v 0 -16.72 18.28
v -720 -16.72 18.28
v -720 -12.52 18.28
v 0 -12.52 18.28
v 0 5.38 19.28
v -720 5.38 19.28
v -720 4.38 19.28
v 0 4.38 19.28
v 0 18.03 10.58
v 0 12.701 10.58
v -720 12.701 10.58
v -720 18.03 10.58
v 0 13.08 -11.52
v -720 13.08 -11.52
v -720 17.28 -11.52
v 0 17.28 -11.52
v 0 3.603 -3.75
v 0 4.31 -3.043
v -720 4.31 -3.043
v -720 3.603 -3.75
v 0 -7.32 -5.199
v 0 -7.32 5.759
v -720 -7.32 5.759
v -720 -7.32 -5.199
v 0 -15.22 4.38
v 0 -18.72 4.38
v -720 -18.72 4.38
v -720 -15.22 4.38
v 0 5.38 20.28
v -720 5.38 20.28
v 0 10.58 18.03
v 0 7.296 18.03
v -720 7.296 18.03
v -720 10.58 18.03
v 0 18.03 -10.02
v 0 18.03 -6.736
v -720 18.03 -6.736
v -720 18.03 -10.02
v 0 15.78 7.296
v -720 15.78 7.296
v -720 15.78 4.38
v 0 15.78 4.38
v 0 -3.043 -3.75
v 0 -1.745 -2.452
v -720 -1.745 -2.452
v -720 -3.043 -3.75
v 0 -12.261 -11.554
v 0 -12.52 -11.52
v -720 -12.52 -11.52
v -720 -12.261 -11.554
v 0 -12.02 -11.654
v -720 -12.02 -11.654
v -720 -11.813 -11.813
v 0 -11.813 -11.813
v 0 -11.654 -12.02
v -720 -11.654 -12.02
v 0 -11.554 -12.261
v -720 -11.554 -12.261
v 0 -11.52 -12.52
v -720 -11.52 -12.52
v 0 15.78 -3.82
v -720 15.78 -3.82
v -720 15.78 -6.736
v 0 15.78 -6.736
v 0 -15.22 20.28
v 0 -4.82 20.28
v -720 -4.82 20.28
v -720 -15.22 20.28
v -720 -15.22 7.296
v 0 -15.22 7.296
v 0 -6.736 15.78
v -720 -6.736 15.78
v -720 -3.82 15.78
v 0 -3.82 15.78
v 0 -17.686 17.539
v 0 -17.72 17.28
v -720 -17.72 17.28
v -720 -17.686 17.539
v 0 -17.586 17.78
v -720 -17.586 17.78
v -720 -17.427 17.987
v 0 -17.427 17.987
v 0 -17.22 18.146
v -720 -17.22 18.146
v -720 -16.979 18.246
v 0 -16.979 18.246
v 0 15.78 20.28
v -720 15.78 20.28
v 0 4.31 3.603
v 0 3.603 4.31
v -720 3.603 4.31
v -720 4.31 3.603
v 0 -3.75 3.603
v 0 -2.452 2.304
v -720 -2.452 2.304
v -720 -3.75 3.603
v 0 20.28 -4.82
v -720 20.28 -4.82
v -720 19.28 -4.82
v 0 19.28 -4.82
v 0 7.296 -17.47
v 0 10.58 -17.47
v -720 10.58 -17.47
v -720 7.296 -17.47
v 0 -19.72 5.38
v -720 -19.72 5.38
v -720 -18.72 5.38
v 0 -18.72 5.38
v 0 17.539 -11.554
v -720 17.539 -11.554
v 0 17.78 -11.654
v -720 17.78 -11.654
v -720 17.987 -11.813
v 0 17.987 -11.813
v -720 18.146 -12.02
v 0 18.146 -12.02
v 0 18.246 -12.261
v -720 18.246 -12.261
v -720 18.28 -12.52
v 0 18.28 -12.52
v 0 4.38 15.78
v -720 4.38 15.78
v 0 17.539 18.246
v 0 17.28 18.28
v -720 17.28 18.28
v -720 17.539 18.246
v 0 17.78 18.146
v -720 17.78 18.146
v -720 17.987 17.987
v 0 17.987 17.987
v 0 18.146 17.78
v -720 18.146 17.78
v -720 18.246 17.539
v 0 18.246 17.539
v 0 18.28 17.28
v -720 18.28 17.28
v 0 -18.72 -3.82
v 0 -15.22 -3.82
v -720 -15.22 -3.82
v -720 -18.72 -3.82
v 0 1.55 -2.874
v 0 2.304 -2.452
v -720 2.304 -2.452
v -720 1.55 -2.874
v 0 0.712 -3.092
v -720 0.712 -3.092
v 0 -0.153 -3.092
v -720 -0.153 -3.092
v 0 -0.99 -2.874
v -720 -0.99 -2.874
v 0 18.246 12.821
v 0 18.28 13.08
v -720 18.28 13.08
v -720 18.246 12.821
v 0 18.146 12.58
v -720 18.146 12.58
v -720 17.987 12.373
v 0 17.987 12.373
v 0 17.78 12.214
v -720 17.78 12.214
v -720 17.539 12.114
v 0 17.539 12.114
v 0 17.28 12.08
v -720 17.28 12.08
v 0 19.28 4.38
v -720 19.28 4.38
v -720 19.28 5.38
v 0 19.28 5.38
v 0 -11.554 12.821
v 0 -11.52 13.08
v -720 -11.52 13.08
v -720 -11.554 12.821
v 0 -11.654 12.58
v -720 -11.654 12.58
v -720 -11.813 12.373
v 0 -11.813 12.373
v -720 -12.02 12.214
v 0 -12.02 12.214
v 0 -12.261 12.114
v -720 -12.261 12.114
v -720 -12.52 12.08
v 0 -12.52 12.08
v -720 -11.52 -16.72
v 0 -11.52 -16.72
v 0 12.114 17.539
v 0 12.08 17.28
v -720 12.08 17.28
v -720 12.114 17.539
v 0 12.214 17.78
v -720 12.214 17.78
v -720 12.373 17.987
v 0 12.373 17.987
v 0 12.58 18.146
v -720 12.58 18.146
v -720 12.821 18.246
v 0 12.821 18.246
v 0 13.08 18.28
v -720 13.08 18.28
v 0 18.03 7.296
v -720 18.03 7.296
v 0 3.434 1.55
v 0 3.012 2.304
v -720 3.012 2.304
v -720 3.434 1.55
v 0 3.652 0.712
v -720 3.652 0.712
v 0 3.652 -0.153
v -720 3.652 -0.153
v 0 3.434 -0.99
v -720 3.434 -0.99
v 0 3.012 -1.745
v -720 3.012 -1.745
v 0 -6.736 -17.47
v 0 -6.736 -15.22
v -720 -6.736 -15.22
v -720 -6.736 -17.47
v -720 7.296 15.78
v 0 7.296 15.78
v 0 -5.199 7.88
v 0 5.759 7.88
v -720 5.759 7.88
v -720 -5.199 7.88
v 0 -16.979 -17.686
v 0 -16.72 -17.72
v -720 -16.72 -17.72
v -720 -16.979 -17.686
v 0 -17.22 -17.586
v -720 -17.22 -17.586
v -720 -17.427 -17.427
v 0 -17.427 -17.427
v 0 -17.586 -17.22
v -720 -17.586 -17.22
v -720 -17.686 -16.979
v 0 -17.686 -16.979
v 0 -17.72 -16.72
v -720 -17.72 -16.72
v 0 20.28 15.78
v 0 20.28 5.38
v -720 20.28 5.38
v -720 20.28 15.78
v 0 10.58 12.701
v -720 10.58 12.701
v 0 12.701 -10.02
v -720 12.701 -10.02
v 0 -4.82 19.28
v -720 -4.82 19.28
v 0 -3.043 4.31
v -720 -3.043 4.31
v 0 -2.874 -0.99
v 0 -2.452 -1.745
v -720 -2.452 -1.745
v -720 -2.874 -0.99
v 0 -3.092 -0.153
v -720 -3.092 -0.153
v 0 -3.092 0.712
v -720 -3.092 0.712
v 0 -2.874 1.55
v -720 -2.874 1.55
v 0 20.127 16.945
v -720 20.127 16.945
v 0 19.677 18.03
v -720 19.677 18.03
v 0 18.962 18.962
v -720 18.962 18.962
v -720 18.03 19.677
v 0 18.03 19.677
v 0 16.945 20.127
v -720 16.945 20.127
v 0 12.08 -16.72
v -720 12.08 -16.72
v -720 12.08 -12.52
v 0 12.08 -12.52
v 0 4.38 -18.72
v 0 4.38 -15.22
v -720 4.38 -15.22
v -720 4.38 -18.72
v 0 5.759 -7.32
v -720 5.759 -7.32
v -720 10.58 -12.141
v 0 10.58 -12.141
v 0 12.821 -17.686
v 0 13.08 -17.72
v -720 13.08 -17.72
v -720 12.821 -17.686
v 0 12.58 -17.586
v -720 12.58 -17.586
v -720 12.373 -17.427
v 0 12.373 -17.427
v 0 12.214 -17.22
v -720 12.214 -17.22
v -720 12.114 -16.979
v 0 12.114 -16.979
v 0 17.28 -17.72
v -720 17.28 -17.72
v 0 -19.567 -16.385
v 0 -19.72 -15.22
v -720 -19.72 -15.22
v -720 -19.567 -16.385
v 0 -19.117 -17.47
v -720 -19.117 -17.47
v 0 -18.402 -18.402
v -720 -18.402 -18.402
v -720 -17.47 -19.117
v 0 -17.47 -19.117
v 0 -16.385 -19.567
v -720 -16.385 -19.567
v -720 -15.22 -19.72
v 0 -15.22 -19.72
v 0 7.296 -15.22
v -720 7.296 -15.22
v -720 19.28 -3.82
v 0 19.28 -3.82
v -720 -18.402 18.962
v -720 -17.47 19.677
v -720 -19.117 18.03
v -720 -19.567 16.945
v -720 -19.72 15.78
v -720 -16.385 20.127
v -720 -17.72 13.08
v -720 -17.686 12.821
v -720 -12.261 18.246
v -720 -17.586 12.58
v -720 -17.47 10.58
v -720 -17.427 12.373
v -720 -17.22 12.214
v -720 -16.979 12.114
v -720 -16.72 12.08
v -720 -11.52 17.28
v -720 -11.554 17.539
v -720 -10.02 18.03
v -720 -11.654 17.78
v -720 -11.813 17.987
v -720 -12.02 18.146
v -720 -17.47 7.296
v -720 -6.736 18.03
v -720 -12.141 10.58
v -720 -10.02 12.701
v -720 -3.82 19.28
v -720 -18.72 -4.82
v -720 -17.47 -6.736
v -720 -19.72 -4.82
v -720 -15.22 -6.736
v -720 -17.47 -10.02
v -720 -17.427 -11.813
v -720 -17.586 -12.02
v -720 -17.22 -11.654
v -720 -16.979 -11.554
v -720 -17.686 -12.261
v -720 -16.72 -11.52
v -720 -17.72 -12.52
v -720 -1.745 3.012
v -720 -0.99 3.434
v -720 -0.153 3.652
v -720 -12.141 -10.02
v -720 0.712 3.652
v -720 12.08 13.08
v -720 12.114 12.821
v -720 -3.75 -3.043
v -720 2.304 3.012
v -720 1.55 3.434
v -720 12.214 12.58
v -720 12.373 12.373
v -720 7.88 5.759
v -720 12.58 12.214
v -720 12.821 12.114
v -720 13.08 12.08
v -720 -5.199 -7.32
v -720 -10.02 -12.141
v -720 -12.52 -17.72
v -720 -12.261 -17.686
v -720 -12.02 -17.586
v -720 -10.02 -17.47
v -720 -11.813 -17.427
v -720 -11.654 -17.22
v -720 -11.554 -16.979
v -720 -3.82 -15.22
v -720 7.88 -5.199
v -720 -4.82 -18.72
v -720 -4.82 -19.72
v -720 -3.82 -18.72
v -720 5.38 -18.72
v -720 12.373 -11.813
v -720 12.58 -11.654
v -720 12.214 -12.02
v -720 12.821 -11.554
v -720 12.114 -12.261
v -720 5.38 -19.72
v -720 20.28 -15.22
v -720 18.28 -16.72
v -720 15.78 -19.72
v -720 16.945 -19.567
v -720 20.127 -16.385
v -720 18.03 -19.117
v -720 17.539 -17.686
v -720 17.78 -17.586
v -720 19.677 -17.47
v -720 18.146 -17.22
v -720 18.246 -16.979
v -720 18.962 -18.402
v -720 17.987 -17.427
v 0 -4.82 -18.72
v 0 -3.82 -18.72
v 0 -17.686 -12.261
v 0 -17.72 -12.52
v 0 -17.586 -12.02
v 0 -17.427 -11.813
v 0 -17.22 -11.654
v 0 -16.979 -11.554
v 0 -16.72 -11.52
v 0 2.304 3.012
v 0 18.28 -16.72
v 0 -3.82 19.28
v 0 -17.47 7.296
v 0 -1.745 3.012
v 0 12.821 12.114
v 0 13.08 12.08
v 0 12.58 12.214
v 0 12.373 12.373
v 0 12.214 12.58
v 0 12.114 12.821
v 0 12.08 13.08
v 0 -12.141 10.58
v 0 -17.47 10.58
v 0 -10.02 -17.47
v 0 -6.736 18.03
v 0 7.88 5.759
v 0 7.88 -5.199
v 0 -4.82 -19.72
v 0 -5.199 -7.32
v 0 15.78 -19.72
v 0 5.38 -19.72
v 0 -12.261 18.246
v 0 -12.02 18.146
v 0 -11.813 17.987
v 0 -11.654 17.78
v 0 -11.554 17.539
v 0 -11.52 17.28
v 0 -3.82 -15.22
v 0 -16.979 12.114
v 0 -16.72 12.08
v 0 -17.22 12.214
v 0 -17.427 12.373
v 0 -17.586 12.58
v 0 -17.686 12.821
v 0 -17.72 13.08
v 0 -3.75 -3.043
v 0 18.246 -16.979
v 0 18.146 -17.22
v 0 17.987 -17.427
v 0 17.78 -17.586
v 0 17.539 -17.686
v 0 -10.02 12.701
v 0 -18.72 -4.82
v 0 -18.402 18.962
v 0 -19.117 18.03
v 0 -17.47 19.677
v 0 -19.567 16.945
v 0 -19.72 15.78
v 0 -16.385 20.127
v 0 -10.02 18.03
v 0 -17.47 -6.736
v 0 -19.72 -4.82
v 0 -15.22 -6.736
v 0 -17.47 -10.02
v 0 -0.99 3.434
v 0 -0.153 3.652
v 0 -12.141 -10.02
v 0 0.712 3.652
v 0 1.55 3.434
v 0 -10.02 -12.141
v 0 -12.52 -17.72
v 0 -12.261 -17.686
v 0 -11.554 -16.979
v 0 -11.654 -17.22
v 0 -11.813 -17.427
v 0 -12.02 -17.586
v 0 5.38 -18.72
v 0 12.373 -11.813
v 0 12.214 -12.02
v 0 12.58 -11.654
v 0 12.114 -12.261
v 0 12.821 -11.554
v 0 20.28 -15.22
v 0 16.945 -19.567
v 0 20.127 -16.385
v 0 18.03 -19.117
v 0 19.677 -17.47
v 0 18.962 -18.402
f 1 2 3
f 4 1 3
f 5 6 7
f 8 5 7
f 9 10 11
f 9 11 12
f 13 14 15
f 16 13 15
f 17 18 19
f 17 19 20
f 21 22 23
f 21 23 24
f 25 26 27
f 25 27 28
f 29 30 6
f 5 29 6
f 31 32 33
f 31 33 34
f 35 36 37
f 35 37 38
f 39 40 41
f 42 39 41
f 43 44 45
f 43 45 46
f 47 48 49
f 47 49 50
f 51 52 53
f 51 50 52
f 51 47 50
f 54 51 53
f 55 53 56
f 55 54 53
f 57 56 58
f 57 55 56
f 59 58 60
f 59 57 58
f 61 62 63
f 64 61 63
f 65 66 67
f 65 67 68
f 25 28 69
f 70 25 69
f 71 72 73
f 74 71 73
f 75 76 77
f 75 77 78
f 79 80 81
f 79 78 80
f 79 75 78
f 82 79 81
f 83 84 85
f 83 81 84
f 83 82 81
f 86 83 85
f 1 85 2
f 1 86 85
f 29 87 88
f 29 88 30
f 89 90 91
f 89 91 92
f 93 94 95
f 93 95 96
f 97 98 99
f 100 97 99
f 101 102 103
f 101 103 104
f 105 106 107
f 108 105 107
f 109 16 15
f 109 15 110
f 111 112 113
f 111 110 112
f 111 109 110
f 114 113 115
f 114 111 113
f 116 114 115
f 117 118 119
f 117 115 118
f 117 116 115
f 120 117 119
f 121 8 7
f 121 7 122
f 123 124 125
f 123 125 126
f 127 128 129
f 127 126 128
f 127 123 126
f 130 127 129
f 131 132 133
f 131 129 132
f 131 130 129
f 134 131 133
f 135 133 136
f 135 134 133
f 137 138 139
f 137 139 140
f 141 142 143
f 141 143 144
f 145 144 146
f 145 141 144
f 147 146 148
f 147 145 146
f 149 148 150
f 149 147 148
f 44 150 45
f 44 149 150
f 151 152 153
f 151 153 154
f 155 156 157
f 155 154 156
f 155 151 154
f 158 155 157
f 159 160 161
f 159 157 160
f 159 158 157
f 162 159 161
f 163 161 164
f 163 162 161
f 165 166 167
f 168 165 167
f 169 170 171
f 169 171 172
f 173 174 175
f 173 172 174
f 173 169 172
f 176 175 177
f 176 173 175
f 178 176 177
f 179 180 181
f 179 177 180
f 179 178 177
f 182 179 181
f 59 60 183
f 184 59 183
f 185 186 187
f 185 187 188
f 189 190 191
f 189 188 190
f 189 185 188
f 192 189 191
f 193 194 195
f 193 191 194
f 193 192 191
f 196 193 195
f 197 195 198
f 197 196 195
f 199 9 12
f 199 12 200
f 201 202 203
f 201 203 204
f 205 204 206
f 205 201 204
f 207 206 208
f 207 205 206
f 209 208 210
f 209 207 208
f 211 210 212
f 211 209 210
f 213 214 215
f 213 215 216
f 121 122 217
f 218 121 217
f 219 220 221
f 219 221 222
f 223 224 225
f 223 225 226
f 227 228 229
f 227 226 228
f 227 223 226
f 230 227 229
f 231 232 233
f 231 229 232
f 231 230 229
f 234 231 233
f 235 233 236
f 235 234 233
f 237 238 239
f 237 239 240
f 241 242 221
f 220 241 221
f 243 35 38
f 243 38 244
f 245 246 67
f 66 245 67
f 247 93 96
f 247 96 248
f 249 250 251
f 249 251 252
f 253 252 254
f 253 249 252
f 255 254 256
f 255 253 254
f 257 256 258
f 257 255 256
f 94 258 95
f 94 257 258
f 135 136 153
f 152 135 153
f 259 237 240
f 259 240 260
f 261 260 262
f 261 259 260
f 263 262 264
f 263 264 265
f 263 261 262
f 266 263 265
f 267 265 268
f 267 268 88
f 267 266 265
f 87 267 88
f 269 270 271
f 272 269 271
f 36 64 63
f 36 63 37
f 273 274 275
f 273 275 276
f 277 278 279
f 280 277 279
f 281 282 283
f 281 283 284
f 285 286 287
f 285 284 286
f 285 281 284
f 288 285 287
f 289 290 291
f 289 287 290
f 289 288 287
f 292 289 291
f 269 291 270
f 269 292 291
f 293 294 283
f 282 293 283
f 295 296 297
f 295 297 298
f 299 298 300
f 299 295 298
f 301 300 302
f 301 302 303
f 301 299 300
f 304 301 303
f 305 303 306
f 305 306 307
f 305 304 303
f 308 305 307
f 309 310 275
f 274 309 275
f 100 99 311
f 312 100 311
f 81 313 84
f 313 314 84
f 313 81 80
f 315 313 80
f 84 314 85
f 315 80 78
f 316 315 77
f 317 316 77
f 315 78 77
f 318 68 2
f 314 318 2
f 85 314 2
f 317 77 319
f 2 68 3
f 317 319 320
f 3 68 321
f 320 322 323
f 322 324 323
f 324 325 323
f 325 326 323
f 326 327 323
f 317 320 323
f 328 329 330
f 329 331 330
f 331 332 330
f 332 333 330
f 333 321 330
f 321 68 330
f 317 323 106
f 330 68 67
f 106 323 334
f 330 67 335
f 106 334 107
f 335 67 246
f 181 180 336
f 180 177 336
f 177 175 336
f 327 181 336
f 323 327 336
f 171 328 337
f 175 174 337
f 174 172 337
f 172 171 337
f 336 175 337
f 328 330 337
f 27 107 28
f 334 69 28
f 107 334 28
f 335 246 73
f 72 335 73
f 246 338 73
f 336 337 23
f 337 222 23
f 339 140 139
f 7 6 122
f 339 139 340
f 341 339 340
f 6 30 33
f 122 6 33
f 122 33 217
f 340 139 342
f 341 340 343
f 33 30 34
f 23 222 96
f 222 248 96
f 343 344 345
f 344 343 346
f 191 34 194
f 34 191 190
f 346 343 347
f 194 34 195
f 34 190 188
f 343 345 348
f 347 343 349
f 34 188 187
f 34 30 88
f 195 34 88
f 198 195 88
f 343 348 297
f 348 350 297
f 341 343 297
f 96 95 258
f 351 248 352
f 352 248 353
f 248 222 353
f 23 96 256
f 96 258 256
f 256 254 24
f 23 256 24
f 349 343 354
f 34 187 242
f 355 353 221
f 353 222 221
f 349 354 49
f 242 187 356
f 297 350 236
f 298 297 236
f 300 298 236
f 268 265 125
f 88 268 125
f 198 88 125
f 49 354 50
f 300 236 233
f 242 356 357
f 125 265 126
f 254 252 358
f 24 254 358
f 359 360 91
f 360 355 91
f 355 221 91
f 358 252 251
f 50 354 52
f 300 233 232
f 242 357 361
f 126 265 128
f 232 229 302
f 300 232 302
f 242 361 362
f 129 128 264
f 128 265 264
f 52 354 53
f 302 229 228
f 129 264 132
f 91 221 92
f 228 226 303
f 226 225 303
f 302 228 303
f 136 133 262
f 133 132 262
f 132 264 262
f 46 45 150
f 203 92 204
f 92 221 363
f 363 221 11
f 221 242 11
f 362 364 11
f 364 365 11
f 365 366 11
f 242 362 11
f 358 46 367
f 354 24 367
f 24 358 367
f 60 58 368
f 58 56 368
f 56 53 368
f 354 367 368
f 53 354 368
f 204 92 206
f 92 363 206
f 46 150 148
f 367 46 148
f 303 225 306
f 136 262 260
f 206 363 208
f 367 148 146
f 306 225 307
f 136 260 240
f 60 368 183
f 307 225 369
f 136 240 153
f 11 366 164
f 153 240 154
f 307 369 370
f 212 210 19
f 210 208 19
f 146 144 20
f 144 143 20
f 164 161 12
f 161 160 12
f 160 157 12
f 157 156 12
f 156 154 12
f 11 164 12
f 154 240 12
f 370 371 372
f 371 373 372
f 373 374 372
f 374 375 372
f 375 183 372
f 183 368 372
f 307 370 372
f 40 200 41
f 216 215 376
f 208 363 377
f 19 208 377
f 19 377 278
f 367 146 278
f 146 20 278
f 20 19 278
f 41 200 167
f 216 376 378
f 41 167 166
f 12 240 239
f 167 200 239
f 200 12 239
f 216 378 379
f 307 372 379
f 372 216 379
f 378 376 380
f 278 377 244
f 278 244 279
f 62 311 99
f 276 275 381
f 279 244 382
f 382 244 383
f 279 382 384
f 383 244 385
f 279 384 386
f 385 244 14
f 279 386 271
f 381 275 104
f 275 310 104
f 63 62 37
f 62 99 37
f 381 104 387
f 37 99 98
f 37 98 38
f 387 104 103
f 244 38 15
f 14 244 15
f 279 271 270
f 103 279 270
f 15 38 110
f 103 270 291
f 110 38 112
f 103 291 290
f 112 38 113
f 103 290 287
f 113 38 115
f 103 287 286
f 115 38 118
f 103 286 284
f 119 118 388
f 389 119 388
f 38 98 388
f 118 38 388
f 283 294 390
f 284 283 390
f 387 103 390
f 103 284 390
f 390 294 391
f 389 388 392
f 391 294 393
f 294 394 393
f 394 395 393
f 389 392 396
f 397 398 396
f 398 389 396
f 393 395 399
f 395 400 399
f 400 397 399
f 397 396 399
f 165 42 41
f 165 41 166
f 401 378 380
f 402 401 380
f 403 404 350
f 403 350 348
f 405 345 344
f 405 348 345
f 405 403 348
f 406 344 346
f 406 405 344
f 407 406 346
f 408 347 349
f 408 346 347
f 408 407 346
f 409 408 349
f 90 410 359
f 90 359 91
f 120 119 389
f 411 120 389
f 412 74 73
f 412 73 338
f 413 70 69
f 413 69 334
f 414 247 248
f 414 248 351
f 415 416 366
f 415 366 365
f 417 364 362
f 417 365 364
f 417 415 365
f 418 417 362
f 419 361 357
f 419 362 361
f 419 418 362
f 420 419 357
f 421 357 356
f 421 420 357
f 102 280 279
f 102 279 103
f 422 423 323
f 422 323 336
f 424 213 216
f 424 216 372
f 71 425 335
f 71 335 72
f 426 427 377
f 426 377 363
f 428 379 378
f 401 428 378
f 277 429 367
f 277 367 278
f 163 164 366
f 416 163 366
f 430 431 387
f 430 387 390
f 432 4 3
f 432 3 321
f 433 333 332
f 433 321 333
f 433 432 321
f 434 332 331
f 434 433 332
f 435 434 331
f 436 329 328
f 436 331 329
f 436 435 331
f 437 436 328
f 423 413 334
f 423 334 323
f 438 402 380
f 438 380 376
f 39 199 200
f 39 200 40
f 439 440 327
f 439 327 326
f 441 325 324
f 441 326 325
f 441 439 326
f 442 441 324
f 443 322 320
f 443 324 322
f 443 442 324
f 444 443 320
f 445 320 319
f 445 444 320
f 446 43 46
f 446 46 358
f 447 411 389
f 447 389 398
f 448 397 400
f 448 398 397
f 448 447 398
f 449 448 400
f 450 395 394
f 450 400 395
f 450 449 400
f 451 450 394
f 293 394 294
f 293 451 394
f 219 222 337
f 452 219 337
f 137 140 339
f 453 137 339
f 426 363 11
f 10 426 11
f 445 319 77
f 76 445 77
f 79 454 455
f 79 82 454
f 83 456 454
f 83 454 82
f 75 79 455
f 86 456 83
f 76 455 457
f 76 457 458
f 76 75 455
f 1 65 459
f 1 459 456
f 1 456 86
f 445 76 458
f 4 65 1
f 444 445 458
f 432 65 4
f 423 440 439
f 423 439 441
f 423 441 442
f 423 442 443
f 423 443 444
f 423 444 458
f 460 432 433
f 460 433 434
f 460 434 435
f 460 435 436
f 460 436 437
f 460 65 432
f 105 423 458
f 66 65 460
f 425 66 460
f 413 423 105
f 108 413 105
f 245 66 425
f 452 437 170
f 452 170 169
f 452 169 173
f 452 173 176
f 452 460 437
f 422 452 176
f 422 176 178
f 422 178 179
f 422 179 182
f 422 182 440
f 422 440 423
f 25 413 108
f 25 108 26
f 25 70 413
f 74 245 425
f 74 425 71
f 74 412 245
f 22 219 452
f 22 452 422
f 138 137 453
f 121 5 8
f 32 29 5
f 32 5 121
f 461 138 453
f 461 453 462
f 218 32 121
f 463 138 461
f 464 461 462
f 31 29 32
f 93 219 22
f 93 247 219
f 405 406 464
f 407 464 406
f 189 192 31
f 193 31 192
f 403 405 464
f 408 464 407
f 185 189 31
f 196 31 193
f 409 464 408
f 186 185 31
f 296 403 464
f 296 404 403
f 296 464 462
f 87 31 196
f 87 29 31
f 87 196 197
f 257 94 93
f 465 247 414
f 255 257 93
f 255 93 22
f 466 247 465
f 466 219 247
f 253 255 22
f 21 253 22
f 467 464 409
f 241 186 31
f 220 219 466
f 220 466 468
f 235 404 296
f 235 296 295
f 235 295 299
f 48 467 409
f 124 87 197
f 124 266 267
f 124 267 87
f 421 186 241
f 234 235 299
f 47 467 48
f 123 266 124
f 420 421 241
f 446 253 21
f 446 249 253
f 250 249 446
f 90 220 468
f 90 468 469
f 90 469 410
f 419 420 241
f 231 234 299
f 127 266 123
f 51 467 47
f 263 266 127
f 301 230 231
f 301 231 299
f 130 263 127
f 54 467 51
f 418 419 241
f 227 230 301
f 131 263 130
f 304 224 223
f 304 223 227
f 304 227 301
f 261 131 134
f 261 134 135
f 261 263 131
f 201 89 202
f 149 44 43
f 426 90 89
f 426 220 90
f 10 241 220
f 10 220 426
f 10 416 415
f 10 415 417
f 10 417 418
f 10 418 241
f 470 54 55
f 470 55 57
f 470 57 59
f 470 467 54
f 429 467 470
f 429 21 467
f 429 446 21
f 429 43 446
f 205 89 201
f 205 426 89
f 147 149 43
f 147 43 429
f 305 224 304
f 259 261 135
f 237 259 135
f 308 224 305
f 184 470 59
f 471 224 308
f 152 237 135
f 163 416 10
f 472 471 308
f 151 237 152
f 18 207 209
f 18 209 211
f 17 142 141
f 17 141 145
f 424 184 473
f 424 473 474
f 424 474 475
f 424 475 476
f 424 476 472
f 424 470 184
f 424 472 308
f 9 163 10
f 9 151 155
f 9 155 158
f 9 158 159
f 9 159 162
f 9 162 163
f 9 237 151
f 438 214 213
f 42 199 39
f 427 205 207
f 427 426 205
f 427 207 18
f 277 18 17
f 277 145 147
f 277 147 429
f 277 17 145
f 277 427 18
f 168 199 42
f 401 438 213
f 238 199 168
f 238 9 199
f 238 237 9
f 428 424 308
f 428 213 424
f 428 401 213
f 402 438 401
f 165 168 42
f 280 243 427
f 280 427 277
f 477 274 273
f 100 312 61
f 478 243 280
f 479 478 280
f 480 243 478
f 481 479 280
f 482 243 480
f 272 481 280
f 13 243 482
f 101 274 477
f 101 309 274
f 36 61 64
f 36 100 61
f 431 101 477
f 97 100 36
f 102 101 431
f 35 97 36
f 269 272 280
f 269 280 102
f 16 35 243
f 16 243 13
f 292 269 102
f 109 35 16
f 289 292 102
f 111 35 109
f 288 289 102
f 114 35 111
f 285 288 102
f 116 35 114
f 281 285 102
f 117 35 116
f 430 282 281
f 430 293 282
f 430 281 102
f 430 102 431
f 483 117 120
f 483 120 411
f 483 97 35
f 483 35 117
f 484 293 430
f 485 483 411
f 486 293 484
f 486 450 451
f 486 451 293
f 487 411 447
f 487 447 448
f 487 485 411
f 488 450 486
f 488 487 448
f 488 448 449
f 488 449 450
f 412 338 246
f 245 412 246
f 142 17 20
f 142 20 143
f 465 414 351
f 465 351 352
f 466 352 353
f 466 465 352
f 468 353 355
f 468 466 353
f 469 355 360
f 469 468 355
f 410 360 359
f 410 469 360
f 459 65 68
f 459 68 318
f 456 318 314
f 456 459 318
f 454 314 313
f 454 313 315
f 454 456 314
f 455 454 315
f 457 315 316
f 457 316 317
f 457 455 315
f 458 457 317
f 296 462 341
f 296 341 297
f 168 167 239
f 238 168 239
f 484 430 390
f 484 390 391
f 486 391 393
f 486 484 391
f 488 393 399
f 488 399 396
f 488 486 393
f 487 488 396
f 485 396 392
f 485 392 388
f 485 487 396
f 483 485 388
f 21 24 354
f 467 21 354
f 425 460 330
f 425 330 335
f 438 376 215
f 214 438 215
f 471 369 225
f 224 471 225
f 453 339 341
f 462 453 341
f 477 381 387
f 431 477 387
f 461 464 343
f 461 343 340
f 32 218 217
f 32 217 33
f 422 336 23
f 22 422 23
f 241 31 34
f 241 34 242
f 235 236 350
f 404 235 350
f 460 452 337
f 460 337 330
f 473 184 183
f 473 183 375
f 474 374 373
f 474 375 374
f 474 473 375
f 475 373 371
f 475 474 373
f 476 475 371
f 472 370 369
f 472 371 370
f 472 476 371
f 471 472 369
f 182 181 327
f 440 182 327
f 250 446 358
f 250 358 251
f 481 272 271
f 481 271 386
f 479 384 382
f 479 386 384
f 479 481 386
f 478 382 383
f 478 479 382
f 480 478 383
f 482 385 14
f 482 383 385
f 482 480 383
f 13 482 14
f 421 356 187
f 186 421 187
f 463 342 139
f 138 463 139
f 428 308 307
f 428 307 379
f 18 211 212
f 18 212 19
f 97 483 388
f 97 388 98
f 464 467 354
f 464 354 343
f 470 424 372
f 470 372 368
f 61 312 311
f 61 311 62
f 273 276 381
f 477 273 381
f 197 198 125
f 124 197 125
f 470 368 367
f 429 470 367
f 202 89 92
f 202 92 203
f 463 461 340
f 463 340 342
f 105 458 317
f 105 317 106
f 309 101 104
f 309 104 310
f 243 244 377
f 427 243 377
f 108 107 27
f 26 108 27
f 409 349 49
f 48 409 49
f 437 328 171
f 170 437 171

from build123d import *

# Parameters (mm, degrees)
EXTRUDE_1_DEPTH = 50
EXTRUDE_2_DEPTH = 720


with BuildPart() as part:
    # 草图1 → 凸台-拉伸1 (new body)
    with BuildSketch(Plane(origin=(0, 0, 0), x_dir=(0, 0, -1), z_dir=(1, 0, 0))):
        with BuildLine():
            Line((4.82004008, 19.27995992), (3.82004008, 19.27995992))
            Line((3.82004008, 19.27995992), (3.82004008, 15.77995992))
            Line((3.82004008, 15.77995992), (6.73639159, 15.77995992))
            Line((6.73639159, 15.77995992), (6.73639159, 18.02995992))
            Line((6.73639159, 18.02995992), (10.02004008, 18.02995992))
            Line((10.02004008, 18.02995992), (10.02004008, 12.70128026))
            Line((10.02004008, 12.70128026), (5.19871974, 7.87995992))
            Line((5.19871974, 7.87995992), (-5.75863958, 7.87995992))
            Line((-5.75863958, 7.87995992), (-10.57995992, 12.70128026))
            Line((-10.57995992, 12.70128026), (-10.57995992, 18.02995992))
            Line((-10.57995992, 18.02995992), (-7.29631143, 18.02995992))
            Line((-7.29631143, 18.02995992), (-7.29631143, 15.77995992))
            Line((-7.29631143, 15.77995992), (-4.37995992, 15.77995992))
            Line((-4.37995992, 15.77995992), (-4.37995992, 19.27995992))
            Line((-4.37995992, 19.27995992), (-5.37995992, 19.27995992))
            Line((-5.37995992, 19.27995992), (-5.37995992, 20.27995992))
            Line((-5.37995992, 20.27995992), (-15.77995992, 20.27995992))
            ThreePointArc((-15.77995992, 20.27995992), (-18.961940435, 18.961940435), (-20.27995992, 15.77995992))
            Line((-20.27995992, 15.77995992), (-20.27995992, 5.37995992))
            Line((-20.27995992, 5.37995992), (-19.27995992, 5.37995992))
            Line((-19.27995992, 5.37995992), (-19.27995992, 4.37995992))
            Line((-19.27995992, 4.37995992), (-15.77995992, 4.37995992))
            Line((-15.77995992, 4.37995992), (-15.77995992, 7.29631143))
            Line((-15.77995992, 7.29631143), (-18.02995992, 7.29631143))
            Line((-18.02995992, 7.29631143), (-18.02995992, 10.57995992))
            Line((-18.02995992, 10.57995992), (-12.70128026, 10.57995992))
            Line((-12.70128026, 10.57995992), (-7.87995992, 5.75863958))
            Line((-7.87995992, 5.75863958), (-7.87995992, -5.19871974))
            Line((-7.87995992, -5.19871974), (-12.70128026, -10.02004008))
            Line((-12.70128026, -10.02004008), (-18.02995992, -10.02004008))
            Line((-18.02995992, -10.02004008), (-18.02995992, -6.73639159))
            Line((-18.02995992, -6.73639159), (-15.77995992, -6.73639159))
            Line((-15.77995992, -6.73639159), (-15.77995992, -3.82004008))
            Line((-15.77995992, -3.82004008), (-19.27995992, -3.82004008))
            Line((-19.27995992, -3.82004008), (-19.27995992, -4.82004008))
            Line((-19.27995992, -4.82004008), (-20.27995992, -4.82004008))
            Line((-20.27995992, -4.82004008), (-20.27995992, -15.22004008))
            ThreePointArc((-20.27995992, -15.22004008), (-18.961940435, -18.402020595), (-15.77995992, -19.72004008))
            Line((-15.77995992, -19.72004008), (-5.37995992, -19.72004008))
            Line((-5.37995992, -19.72004008), (-5.37995992, -18.72004008))
            Line((-5.37995992, -18.72004008), (-4.37995992, -18.72004008))
            Line((-4.37995992, -18.72004008), (-4.37995992, -15.22004008))
            Line((-4.37995992, -15.22004008), (-7.29631143, -15.22004008))
            Line((-7.29631143, -15.22004008), (-7.29631143, -17.47004008))
            Line((-7.29631143, -17.47004008), (-10.57995992, -17.47004008))
            Line((-10.57995992, -17.47004008), (-10.57995992, -12.14136042))
            Line((-10.57995992, -12.14136042), (-5.75863958, -7.32004008))
            Line((-5.75863958, -7.32004008), (5.19871974, -7.32004008))
            Line((5.19871974, -7.32004008), (10.02004008, -12.14136042))
            Line((10.02004008, -12.14136042), (10.02004008, -17.47004008))
            Line((10.02004008, -17.47004008), (6.73639159, -17.47004008))
            Line((6.73639159, -17.47004008), (6.73639159, -15.22004008))
            Line((6.73639159, -15.22004008), (3.82004008, -15.22004008))
            Line((3.82004008, -15.22004008), (3.82004008, -18.72004008))
            Line((3.82004008, -18.72004008), (4.82004008, -18.72004008))
            Line((4.82004008, -18.72004008), (4.82004008, -19.72004008))
            Line((4.82004008, -19.72004008), (15.22004008, -19.72004008))
            ThreePointArc((15.22004008, -19.72004008), (18.402020595, -18.402020595), (19.72004008, -15.22004008))
            Line((19.72004008, -15.22004008), (19.72004008, -4.82004008))
            Line((19.72004008, -4.82004008), (18.72004008, -4.82004008))
            Line((18.72004008, -4.82004008), (18.72004008, -3.82004008))
            Line((18.72004008, -3.82004008), (15.22004008, -3.82004008))
            Line((15.22004008, -3.82004008), (15.22004008, -6.73639159))
            Line((15.22004008, -6.73639159), (17.47004008, -6.73639159))
            Line((17.47004008, -6.73639159), (17.47004008, -10.02004008))
            Line((17.47004008, -10.02004008), (12.14136042, -10.02004008))
            Line((12.14136042, -10.02004008), (7.32004008, -5.19871974))
            Line((7.32004008, -5.19871974), (7.32004008, 5.75863958))
            Line((7.32004008, 5.75863958), (12.14136042, 10.57995992))
            Line((12.14136042, 10.57995992), (17.47004008, 10.57995992))
            Line((17.47004008, 10.57995992), (17.47004008, 7.29631143))
            Line((17.47004008, 7.29631143), (15.22004008, 7.29631143))
            Line((15.22004008, 7.29631143), (15.22004008, 4.37995992))
            Line((15.22004008, 4.37995992), (18.72004008, 4.37995992))
            Line((18.72004008, 4.37995992), (18.72004008, 5.37995992))
            Line((18.72004008, 5.37995992), (19.72004008, 5.37995992))
            Line((19.72004008, 5.37995992), (19.72004008, 15.77995992))
            ThreePointArc((19.72004008, 15.77995992), (18.402020595, 18.961940435), (15.22004008, 20.27995992))
            Line((15.22004008, 20.27995992), (4.82004008, 20.27995992))
            Line((4.82004008, 20.27995992), (4.82004008, 19.27995992))
        make_face()
        with BuildLine():
            Line((-13.07995992, -17.72004008), (-17.27995992, -17.72004008))
            ThreePointArc((-17.27995992, -17.72004008), (-17.987066701, -17.427146861), (-18.27995992, -16.72004008))
            Line((-18.27995992, -16.72004008), (-18.27995992, -12.52004008))
            ThreePointArc((-18.27995992, -12.52004008), (-17.987066701, -11.812933299), (-17.27995992, -11.52004008))
            Line((-17.27995992, -11.52004008), (-13.07995992, -11.52004008))
            ThreePointArc((-13.07995992, -11.52004008), (-12.372853139, -11.812933299), (-12.07995992, -12.52004008))
            Line((-12.07995992, -12.52004008), (-12.07995992, -16.72004008))
            ThreePointArc((-12.07995992, -16.72004008), (-12.372853139, -17.427146861), (-13.07995992, -17.72004008))
        make_face(mode=Mode.SUBTRACT)
        with BuildLine():
            Line((-17.27995992, 18.27995992), (-13.07995992, 18.27995992))
            ThreePointArc((-13.07995992, 18.27995992), (-12.372853139, 17.987066701), (-12.07995992, 17.27995992))
            Line((-12.07995992, 17.27995992), (-12.07995992, 13.07995992))
            ThreePointArc((-12.07995992, 13.07995992), (-12.372853139, 12.372853139), (-13.07995992, 12.07995992))
            Line((-13.07995992, 12.07995992), (-17.27995992, 12.07995992))
            ThreePointArc((-17.27995992, 12.07995992), (-17.987066701, 12.372853139), (-18.27995992, 13.07995992))
            Line((-18.27995992, 13.07995992), (-18.27995992, 17.27995992))
            ThreePointArc((-18.27995992, 17.27995992), (-17.987066701, 17.987066701), (-17.27995992, 18.27995992))
        make_face(mode=Mode.SUBTRACT)
        with BuildLine():
            Line((16.72004008, 12.07995992), (12.52004008, 12.07995992))
            ThreePointArc((12.52004008, 12.07995992), (11.812933299, 12.372853139), (11.52004008, 13.07995992))
            Line((11.52004008, 13.07995992), (11.52004008, 17.27995992))
            ThreePointArc((11.52004008, 17.27995992), (11.812933299, 17.987066701), (12.52004008, 18.27995992))
            Line((12.52004008, 18.27995992), (16.72004008, 18.27995992))
            ThreePointArc((16.72004008, 18.27995992), (17.427146861, 17.987066701), (17.72004008, 17.27995992))
            Line((17.72004008, 17.27995992), (17.72004008, 13.07995992))
            ThreePointArc((17.72004008, 13.07995992), (17.427146861, 12.372853139), (16.72004008, 12.07995992))
        make_face(mode=Mode.SUBTRACT)
        with BuildLine():
            Line((3.75045895, -3.04335217), (3.04335217, -3.75045895))
            Line((3.04335217, -3.75045895), (1.74451108, -2.45161786))
            ThreePointArc((1.74451108, -2.45161786), (-0.27995992, -3.12004008), (-2.30443092, -2.45161786))
            Line((-2.30443092, -2.45161786), (-3.60327201, -3.75045895))
            Line((-3.60327201, -3.75045895), (-4.31037879, -3.04335217))
            Line((-4.31037879, -3.04335217), (-3.0115377, -1.74451108))
            ThreePointArc((-3.0115377, -1.74451108), (-3.67995992, 0.27995992), (-3.0115377, 2.30443092))
            Line((-3.0115377, 2.30443092), (-4.31037879, 3.60327201))
            Line((-4.31037879, 3.60327201), (-3.60327201, 4.31037879))
            Line((-3.60327201, 4.31037879), (-2.30443092, 3.0115377))
            ThreePointArc((-2.30443092, 3.0115377), (-0.27995992, 3.67995992), (1.74451108, 3.0115377))
            Line((1.74451108, 3.0115377), (3.04335217, 4.31037879))
            Line((3.04335217, 4.31037879), (3.75045895, 3.60327201))
            Line((3.75045895, 3.60327201), (2.45161786, 2.30443092))
            ThreePointArc((2.45161786, 2.30443092), (3.12004008, 0.27995992), (2.45161786, -1.74451108))
            Line((2.45161786, -1.74451108), (3.75045895, -3.04335217))
        make_face(mode=Mode.SUBTRACT)
        with BuildLine():
            Line((17.72004008, -12.52004008), (17.72004008, -16.72004008))
            ThreePointArc((17.72004008, -16.72004008), (17.427146861, -17.427146861), (16.72004008, -17.72004008))
            Line((16.72004008, -17.72004008), (12.52004008, -17.72004008))
            ThreePointArc((12.52004008, -17.72004008), (11.812933299, -17.427146861), (11.52004008, -16.72004008))
            Line((11.52004008, -16.72004008), (11.52004008, -12.52004008))
            ThreePointArc((11.52004008, -12.52004008), (11.812933299, -11.812933299), (12.52004008, -11.52004008))
            Line((12.52004008, -11.52004008), (16.72004008, -11.52004008))
            ThreePointArc((16.72004008, -11.52004008), (17.427146861, -11.812933299), (17.72004008, -12.52004008))
        make_face(mode=Mode.SUBTRACT)
    extrude(amount=-EXTRUDE_1_DEPTH)

    # 草图2 → 凸台-拉伸2 (add)
    with BuildSketch(Plane(origin=(0, 0, 0), x_dir=(0, 0, -1), z_dir=(1, 0, 0))):
        with BuildLine():
            Line((19.72004008, 5.37995992), (19.72004008, 15.77995992))
            ThreePointArc((19.72004008, 15.77995992), (18.402020595, 18.961940435), (15.22004008, 20.27995992))
            Line((15.22004008, 20.27995992), (4.82004008, 20.27995992))
            Line((4.82004008, 20.27995992), (4.82004008, 19.27995992))
            Line((4.82004008, 19.27995992), (3.82004008, 19.27995992))
            Line((3.82004008, 19.27995992), (3.82004008, 15.77995992))
            Line((3.82004008, 15.77995992), (6.73639159, 15.77995992))
            Line((6.73639159, 15.77995992), (6.73639159, 18.02995992))
            Line((6.73639159, 18.02995992), (10.02004008, 18.02995992))
            Line((10.02004008, 18.02995992), (10.02004008, 12.70128026))
            Line((10.02004008, 12.70128026), (5.19871974, 7.87995992))
            Line((5.19871974, 7.87995992), (-5.75863958, 7.87995992))
            Line((-5.75863958, 7.87995992), (-10.57995992, 12.70128026))
            Line((-10.57995992, 12.70128026), (-10.57995992, 18.02995992))
            Line((-10.57995992, 18.02995992), (-7.29631143, 18.02995992))
            Line((-7.29631143, 18.02995992), (-7.29631143, 15.77995992))
            Line((-7.29631143, 15.77995992), (-4.37995992, 15.77995992))
            Line((-4.37995992, 15.77995992), (-4.37995992, 19.27995992))
            Line((-4.37995992, 19.27995992), (-5.37995992, 19.27995992))
            Line((-5.37995992, 19.27995992), (-5.37995992, 20.27995992))
            Line((-5.37995992, 20.27995992), (-15.77995992, 20.27995992))
            ThreePointArc((-15.77995992, 20.27995992), (-18.961940435, 18.961940435), (-20.27995992, 15.77995992))
            Line((-20.27995992, 15.77995992), (-20.27995992, 5.37995992))
            Line((-20.27995992, 5.37995992), (-19.27995992, 5.37995992))
            Line((-19.27995992, 5.37995992), (-19.27995992, 4.37995992))
            Line((-19.27995992, 4.37995992), (-15.77995992, 4.37995992))
            Line((-15.77995992, 4.37995992), (-15.77995992, 7.29631143))
            Line((-15.77995992, 7.29631143), (-18.02995992, 7.29631143))
            Line((-18.02995992, 7.29631143), (-18.02995992, 10.57995992))
            Line((-18.02995992, 10.57995992), (-12.70128026, 10.57995992))
            Line((-12.70128026, 10.57995992), (-7.87995992, 5.75863958))
            Line((-7.87995992, 5.75863958), (-7.87995992, -5.19871974))
            Line((-7.87995992, -5.19871974), (-12.70128026, -10.02004008))
            Line((-12.70128026, -10.02004008), (-18.02995992, -10.02004008))
            Line((-18.02995992, -10.02004008), (-18.02995992, -6.73639159))
            Line((-18.02995992, -6.73639159), (-15.77995992, -6.73639159))
            Line((-15.77995992, -6.73639159), (-15.77995992, -3.82004008))
            Line((-15.77995992, -3.82004008), (-19.27995992, -3.82004008))
            Line((-19.27995992, -3.82004008), (-19.27995992, -4.82004008))
            Line((-19.27995992, -4.82004008), (-20.27995992, -4.82004008))
            Line((-20.27995992, -4.82004008), (-20.27995992, -15.22004008))
            ThreePointArc((-20.27995992, -15.22004008), (-18.961940435, -18.402020595), (-15.77995992, -19.72004008))
            Line((-15.77995992, -19.72004008), (-5.37995992, -19.72004008))
            Line((-5.37995992, -19.72004008), (-5.37995992, -18.72004008))
            Line((-5.37995992, -18.72004008), (-4.37995992, -18.72004008))
            Line((-4.37995992, -18.72004008), (-4.37995992, -15.22004008))
            Line((-4.37995992, -15.22004008), (-7.29631143, -15.22004008))
            Line((-7.29631143, -15.22004008), (-7.29631143, -17.47004008))
            Line((-7.29631143, -17.47004008), (-10.57995992, -17.47004008))
            Line((-10.57995992, -17.47004008), (-10.57995992, -12.14136042))
            Line((-10.57995992, -12.14136042), (-5.75863958, -7.32004008))
            Line((-5.75863958, -7.32004008), (5.19871974, -7.32004008))
            Line((5.19871974, -7.32004008), (10.02004008, -12.14136042))
            Line((10.02004008, -12.14136042), (10.02004008, -17.47004008))
            Line((10.02004008, -17.47004008), (6.73639159, -17.47004008))
            Line((6.73639159, -17.47004008), (6.73639159, -15.22004008))
            Line((6.73639159, -15.22004008), (3.82004008, -15.22004008))
            Line((3.82004008, -15.22004008), (3.82004008, -18.72004008))
            Line((3.82004008, -18.72004008), (4.82004008, -18.72004008))
            Line((4.82004008, -18.72004008), (4.82004008, -19.72004008))
            Line((4.82004008, -19.72004008), (15.22004008, -19.72004008))
            ThreePointArc((15.22004008, -19.72004008), (18.402020595, -18.402020595), (19.72004008, -15.22004008))
            Line((19.72004008, -15.22004008), (19.72004008, -4.82004008))
            Line((19.72004008, -4.82004008), (18.72004008, -4.82004008))
            Line((18.72004008, -4.82004008), (18.72004008, -3.82004008))
            Line((18.72004008, -3.82004008), (15.22004008, -3.82004008))
            Line((15.22004008, -3.82004008), (15.22004008, -6.73639159))
            Line((15.22004008, -6.73639159), (17.47004008, -6.73639159))
            Line((17.47004008, -6.73639159), (17.47004008, -10.02004008))
            Line((17.47004008, -10.02004008), (12.14136042, -10.02004008))
            Line((12.14136042, -10.02004008), (7.32004008, -5.19871974))
            Line((7.32004008, -5.19871974), (7.32004008, 5.75863958))
            Line((7.32004008, 5.75863958), (12.14136042, 10.57995992))
            Line((12.14136042, 10.57995992), (17.47004008, 10.57995992))
            Line((17.47004008, 10.57995992), (17.47004008, 7.29631143))
            Line((17.47004008, 7.29631143), (15.22004008, 7.29631143))
            Line((15.22004008, 7.29631143), (15.22004008, 4.37995992))
            Line((15.22004008, 4.37995992), (18.72004008, 4.37995992))
            Line((18.72004008, 4.37995992), (18.72004008, 5.37995992))
            Line((18.72004008, 5.37995992), (19.72004008, 5.37995992))
        make_face()
        with BuildLine():
            Line((-17.27995992, -17.72004008), (-13.07995992, -17.72004008))
            ThreePointArc((-13.07995992, -17.72004008), (-12.372853139, -17.427146861), (-12.07995992, -16.72004008))
            Line((-12.07995992, -16.72004008), (-12.07995992, -12.52004008))
            ThreePointArc((-12.07995992, -12.52004008), (-12.372853139, -11.812933299), (-13.07995992, -11.52004008))
            Line((-13.07995992, -11.52004008), (-17.27995992, -11.52004008))
            ThreePointArc((-17.27995992, -11.52004008), (-17.987066701, -11.812933299), (-18.27995992, -12.52004008))
            Line((-18.27995992, -12.52004008), (-18.27995992, -16.72004008))
            ThreePointArc((-18.27995992, -16.72004008), (-17.987066701, -17.427146861), (-17.27995992, -17.72004008))
        make_face(mode=Mode.SUBTRACT)
        with BuildLine():
            Line((-13.07995992, 18.27995992), (-17.27995992, 18.27995992))
            ThreePointArc((-17.27995992, 18.27995992), (-17.987066701, 17.987066701), (-18.27995992, 17.27995992))
            Line((-18.27995992, 17.27995992), (-18.27995992, 13.07995992))
            ThreePointArc((-18.27995992, 13.07995992), (-17.987066701, 12.372853139), (-17.27995992, 12.07995992))
            Line((-17.27995992, 12.07995992), (-13.07995992, 12.07995992))
            ThreePointArc((-13.07995992, 12.07995992), (-12.372853139, 12.372853139), (-12.07995992, 13.07995992))
            Line((-12.07995992, 13.07995992), (-12.07995992, 17.27995992))
            ThreePointArc((-12.07995992, 17.27995992), (-12.372853139, 17.987066701), (-13.07995992, 18.27995992))
        make_face(mode=Mode.SUBTRACT)
        with BuildLine():
            Line((11.52004008, 17.27995992), (11.52004008, 13.07995992))
            ThreePointArc((11.52004008, 13.07995992), (11.812933299, 12.372853139), (12.52004008, 12.07995992))
            Line((12.52004008, 12.07995992), (16.72004008, 12.07995992))
            ThreePointArc((16.72004008, 12.07995992), (17.427146861, 12.372853139), (17.72004008, 13.07995992))
            Line((17.72004008, 13.07995992), (17.72004008, 17.27995992))
            ThreePointArc((17.72004008, 17.27995992), (17.427146861, 17.987066701), (16.72004008, 18.27995992))
            Line((16.72004008, 18.27995992), (12.52004008, 18.27995992))
            ThreePointArc((12.52004008, 18.27995992), (11.812933299, 17.987066701), (11.52004008, 17.27995992))
        make_face(mode=Mode.SUBTRACT)
        with BuildLine():
            Line((11.52004008, -12.52004008), (11.52004008, -16.72004008))
            ThreePointArc((11.52004008, -16.72004008), (11.812933299, -17.427146861), (12.52004008, -17.72004008))
            Line((12.52004008, -17.72004008), (16.72004008, -17.72004008))
            ThreePointArc((16.72004008, -17.72004008), (17.427146861, -17.427146861), (17.72004008, -16.72004008))
            Line((17.72004008, -16.72004008), (17.72004008, -12.52004008))
            ThreePointArc((17.72004008, -12.52004008), (17.427146861, -11.812933299), (16.72004008, -11.52004008))
            Line((16.72004008, -11.52004008), (12.52004008, -11.52004008))
            ThreePointArc((12.52004008, -11.52004008), (11.812933299, -11.812933299), (11.52004008, -12.52004008))
        make_face(mode=Mode.SUBTRACT)
        with BuildLine():
            Line((-4.31037879, 3.60327201), (-3.0115377, 2.30443092))
            ThreePointArc((-3.0115377, 2.30443092), (-3.67995992, 0.27995992), (-3.0115377, -1.74451108))
            Line((-3.0115377, -1.74451108), (-4.31037879, -3.04335217))
            Line((-4.31037879, -3.04335217), (-3.60327201, -3.75045895))
            Line((-3.60327201, -3.75045895), (-2.30443092, -2.45161786))
            ThreePointArc((-2.30443092, -2.45161786), (-0.27995992, -3.12004008), (1.74451108, -2.45161786))
            Line((1.74451108, -2.45161786), (3.04335217, -3.75045895))
            Line((3.04335217, -3.75045895), (3.75045895, -3.04335217))
            Line((3.75045895, -3.04335217), (2.45161786, -1.74451108))
            ThreePointArc((2.45161786, -1.74451108), (3.12004008, 0.27995992), (2.45161786, 2.30443092))
            Line((2.45161786, 2.30443092), (3.75045895, 3.60327201))
            Line((3.75045895, 3.60327201), (3.04335217, 4.31037879))
            Line((3.04335217, 4.31037879), (1.74451108, 3.0115377))
            ThreePointArc((1.74451108, 3.0115377), (-0.27995992, 3.67995992), (-2.30443092, 3.0115377))
            Line((-2.30443092, 3.0115377), (-3.60327201, 4.31037879))
            Line((-3.60327201, 4.31037879), (-4.31037879, 3.60327201))
        make_face(mode=Mode.SUBTRACT)
    extrude(amount=-EXTRUDE_2_DEPTH)


solid = part.part
